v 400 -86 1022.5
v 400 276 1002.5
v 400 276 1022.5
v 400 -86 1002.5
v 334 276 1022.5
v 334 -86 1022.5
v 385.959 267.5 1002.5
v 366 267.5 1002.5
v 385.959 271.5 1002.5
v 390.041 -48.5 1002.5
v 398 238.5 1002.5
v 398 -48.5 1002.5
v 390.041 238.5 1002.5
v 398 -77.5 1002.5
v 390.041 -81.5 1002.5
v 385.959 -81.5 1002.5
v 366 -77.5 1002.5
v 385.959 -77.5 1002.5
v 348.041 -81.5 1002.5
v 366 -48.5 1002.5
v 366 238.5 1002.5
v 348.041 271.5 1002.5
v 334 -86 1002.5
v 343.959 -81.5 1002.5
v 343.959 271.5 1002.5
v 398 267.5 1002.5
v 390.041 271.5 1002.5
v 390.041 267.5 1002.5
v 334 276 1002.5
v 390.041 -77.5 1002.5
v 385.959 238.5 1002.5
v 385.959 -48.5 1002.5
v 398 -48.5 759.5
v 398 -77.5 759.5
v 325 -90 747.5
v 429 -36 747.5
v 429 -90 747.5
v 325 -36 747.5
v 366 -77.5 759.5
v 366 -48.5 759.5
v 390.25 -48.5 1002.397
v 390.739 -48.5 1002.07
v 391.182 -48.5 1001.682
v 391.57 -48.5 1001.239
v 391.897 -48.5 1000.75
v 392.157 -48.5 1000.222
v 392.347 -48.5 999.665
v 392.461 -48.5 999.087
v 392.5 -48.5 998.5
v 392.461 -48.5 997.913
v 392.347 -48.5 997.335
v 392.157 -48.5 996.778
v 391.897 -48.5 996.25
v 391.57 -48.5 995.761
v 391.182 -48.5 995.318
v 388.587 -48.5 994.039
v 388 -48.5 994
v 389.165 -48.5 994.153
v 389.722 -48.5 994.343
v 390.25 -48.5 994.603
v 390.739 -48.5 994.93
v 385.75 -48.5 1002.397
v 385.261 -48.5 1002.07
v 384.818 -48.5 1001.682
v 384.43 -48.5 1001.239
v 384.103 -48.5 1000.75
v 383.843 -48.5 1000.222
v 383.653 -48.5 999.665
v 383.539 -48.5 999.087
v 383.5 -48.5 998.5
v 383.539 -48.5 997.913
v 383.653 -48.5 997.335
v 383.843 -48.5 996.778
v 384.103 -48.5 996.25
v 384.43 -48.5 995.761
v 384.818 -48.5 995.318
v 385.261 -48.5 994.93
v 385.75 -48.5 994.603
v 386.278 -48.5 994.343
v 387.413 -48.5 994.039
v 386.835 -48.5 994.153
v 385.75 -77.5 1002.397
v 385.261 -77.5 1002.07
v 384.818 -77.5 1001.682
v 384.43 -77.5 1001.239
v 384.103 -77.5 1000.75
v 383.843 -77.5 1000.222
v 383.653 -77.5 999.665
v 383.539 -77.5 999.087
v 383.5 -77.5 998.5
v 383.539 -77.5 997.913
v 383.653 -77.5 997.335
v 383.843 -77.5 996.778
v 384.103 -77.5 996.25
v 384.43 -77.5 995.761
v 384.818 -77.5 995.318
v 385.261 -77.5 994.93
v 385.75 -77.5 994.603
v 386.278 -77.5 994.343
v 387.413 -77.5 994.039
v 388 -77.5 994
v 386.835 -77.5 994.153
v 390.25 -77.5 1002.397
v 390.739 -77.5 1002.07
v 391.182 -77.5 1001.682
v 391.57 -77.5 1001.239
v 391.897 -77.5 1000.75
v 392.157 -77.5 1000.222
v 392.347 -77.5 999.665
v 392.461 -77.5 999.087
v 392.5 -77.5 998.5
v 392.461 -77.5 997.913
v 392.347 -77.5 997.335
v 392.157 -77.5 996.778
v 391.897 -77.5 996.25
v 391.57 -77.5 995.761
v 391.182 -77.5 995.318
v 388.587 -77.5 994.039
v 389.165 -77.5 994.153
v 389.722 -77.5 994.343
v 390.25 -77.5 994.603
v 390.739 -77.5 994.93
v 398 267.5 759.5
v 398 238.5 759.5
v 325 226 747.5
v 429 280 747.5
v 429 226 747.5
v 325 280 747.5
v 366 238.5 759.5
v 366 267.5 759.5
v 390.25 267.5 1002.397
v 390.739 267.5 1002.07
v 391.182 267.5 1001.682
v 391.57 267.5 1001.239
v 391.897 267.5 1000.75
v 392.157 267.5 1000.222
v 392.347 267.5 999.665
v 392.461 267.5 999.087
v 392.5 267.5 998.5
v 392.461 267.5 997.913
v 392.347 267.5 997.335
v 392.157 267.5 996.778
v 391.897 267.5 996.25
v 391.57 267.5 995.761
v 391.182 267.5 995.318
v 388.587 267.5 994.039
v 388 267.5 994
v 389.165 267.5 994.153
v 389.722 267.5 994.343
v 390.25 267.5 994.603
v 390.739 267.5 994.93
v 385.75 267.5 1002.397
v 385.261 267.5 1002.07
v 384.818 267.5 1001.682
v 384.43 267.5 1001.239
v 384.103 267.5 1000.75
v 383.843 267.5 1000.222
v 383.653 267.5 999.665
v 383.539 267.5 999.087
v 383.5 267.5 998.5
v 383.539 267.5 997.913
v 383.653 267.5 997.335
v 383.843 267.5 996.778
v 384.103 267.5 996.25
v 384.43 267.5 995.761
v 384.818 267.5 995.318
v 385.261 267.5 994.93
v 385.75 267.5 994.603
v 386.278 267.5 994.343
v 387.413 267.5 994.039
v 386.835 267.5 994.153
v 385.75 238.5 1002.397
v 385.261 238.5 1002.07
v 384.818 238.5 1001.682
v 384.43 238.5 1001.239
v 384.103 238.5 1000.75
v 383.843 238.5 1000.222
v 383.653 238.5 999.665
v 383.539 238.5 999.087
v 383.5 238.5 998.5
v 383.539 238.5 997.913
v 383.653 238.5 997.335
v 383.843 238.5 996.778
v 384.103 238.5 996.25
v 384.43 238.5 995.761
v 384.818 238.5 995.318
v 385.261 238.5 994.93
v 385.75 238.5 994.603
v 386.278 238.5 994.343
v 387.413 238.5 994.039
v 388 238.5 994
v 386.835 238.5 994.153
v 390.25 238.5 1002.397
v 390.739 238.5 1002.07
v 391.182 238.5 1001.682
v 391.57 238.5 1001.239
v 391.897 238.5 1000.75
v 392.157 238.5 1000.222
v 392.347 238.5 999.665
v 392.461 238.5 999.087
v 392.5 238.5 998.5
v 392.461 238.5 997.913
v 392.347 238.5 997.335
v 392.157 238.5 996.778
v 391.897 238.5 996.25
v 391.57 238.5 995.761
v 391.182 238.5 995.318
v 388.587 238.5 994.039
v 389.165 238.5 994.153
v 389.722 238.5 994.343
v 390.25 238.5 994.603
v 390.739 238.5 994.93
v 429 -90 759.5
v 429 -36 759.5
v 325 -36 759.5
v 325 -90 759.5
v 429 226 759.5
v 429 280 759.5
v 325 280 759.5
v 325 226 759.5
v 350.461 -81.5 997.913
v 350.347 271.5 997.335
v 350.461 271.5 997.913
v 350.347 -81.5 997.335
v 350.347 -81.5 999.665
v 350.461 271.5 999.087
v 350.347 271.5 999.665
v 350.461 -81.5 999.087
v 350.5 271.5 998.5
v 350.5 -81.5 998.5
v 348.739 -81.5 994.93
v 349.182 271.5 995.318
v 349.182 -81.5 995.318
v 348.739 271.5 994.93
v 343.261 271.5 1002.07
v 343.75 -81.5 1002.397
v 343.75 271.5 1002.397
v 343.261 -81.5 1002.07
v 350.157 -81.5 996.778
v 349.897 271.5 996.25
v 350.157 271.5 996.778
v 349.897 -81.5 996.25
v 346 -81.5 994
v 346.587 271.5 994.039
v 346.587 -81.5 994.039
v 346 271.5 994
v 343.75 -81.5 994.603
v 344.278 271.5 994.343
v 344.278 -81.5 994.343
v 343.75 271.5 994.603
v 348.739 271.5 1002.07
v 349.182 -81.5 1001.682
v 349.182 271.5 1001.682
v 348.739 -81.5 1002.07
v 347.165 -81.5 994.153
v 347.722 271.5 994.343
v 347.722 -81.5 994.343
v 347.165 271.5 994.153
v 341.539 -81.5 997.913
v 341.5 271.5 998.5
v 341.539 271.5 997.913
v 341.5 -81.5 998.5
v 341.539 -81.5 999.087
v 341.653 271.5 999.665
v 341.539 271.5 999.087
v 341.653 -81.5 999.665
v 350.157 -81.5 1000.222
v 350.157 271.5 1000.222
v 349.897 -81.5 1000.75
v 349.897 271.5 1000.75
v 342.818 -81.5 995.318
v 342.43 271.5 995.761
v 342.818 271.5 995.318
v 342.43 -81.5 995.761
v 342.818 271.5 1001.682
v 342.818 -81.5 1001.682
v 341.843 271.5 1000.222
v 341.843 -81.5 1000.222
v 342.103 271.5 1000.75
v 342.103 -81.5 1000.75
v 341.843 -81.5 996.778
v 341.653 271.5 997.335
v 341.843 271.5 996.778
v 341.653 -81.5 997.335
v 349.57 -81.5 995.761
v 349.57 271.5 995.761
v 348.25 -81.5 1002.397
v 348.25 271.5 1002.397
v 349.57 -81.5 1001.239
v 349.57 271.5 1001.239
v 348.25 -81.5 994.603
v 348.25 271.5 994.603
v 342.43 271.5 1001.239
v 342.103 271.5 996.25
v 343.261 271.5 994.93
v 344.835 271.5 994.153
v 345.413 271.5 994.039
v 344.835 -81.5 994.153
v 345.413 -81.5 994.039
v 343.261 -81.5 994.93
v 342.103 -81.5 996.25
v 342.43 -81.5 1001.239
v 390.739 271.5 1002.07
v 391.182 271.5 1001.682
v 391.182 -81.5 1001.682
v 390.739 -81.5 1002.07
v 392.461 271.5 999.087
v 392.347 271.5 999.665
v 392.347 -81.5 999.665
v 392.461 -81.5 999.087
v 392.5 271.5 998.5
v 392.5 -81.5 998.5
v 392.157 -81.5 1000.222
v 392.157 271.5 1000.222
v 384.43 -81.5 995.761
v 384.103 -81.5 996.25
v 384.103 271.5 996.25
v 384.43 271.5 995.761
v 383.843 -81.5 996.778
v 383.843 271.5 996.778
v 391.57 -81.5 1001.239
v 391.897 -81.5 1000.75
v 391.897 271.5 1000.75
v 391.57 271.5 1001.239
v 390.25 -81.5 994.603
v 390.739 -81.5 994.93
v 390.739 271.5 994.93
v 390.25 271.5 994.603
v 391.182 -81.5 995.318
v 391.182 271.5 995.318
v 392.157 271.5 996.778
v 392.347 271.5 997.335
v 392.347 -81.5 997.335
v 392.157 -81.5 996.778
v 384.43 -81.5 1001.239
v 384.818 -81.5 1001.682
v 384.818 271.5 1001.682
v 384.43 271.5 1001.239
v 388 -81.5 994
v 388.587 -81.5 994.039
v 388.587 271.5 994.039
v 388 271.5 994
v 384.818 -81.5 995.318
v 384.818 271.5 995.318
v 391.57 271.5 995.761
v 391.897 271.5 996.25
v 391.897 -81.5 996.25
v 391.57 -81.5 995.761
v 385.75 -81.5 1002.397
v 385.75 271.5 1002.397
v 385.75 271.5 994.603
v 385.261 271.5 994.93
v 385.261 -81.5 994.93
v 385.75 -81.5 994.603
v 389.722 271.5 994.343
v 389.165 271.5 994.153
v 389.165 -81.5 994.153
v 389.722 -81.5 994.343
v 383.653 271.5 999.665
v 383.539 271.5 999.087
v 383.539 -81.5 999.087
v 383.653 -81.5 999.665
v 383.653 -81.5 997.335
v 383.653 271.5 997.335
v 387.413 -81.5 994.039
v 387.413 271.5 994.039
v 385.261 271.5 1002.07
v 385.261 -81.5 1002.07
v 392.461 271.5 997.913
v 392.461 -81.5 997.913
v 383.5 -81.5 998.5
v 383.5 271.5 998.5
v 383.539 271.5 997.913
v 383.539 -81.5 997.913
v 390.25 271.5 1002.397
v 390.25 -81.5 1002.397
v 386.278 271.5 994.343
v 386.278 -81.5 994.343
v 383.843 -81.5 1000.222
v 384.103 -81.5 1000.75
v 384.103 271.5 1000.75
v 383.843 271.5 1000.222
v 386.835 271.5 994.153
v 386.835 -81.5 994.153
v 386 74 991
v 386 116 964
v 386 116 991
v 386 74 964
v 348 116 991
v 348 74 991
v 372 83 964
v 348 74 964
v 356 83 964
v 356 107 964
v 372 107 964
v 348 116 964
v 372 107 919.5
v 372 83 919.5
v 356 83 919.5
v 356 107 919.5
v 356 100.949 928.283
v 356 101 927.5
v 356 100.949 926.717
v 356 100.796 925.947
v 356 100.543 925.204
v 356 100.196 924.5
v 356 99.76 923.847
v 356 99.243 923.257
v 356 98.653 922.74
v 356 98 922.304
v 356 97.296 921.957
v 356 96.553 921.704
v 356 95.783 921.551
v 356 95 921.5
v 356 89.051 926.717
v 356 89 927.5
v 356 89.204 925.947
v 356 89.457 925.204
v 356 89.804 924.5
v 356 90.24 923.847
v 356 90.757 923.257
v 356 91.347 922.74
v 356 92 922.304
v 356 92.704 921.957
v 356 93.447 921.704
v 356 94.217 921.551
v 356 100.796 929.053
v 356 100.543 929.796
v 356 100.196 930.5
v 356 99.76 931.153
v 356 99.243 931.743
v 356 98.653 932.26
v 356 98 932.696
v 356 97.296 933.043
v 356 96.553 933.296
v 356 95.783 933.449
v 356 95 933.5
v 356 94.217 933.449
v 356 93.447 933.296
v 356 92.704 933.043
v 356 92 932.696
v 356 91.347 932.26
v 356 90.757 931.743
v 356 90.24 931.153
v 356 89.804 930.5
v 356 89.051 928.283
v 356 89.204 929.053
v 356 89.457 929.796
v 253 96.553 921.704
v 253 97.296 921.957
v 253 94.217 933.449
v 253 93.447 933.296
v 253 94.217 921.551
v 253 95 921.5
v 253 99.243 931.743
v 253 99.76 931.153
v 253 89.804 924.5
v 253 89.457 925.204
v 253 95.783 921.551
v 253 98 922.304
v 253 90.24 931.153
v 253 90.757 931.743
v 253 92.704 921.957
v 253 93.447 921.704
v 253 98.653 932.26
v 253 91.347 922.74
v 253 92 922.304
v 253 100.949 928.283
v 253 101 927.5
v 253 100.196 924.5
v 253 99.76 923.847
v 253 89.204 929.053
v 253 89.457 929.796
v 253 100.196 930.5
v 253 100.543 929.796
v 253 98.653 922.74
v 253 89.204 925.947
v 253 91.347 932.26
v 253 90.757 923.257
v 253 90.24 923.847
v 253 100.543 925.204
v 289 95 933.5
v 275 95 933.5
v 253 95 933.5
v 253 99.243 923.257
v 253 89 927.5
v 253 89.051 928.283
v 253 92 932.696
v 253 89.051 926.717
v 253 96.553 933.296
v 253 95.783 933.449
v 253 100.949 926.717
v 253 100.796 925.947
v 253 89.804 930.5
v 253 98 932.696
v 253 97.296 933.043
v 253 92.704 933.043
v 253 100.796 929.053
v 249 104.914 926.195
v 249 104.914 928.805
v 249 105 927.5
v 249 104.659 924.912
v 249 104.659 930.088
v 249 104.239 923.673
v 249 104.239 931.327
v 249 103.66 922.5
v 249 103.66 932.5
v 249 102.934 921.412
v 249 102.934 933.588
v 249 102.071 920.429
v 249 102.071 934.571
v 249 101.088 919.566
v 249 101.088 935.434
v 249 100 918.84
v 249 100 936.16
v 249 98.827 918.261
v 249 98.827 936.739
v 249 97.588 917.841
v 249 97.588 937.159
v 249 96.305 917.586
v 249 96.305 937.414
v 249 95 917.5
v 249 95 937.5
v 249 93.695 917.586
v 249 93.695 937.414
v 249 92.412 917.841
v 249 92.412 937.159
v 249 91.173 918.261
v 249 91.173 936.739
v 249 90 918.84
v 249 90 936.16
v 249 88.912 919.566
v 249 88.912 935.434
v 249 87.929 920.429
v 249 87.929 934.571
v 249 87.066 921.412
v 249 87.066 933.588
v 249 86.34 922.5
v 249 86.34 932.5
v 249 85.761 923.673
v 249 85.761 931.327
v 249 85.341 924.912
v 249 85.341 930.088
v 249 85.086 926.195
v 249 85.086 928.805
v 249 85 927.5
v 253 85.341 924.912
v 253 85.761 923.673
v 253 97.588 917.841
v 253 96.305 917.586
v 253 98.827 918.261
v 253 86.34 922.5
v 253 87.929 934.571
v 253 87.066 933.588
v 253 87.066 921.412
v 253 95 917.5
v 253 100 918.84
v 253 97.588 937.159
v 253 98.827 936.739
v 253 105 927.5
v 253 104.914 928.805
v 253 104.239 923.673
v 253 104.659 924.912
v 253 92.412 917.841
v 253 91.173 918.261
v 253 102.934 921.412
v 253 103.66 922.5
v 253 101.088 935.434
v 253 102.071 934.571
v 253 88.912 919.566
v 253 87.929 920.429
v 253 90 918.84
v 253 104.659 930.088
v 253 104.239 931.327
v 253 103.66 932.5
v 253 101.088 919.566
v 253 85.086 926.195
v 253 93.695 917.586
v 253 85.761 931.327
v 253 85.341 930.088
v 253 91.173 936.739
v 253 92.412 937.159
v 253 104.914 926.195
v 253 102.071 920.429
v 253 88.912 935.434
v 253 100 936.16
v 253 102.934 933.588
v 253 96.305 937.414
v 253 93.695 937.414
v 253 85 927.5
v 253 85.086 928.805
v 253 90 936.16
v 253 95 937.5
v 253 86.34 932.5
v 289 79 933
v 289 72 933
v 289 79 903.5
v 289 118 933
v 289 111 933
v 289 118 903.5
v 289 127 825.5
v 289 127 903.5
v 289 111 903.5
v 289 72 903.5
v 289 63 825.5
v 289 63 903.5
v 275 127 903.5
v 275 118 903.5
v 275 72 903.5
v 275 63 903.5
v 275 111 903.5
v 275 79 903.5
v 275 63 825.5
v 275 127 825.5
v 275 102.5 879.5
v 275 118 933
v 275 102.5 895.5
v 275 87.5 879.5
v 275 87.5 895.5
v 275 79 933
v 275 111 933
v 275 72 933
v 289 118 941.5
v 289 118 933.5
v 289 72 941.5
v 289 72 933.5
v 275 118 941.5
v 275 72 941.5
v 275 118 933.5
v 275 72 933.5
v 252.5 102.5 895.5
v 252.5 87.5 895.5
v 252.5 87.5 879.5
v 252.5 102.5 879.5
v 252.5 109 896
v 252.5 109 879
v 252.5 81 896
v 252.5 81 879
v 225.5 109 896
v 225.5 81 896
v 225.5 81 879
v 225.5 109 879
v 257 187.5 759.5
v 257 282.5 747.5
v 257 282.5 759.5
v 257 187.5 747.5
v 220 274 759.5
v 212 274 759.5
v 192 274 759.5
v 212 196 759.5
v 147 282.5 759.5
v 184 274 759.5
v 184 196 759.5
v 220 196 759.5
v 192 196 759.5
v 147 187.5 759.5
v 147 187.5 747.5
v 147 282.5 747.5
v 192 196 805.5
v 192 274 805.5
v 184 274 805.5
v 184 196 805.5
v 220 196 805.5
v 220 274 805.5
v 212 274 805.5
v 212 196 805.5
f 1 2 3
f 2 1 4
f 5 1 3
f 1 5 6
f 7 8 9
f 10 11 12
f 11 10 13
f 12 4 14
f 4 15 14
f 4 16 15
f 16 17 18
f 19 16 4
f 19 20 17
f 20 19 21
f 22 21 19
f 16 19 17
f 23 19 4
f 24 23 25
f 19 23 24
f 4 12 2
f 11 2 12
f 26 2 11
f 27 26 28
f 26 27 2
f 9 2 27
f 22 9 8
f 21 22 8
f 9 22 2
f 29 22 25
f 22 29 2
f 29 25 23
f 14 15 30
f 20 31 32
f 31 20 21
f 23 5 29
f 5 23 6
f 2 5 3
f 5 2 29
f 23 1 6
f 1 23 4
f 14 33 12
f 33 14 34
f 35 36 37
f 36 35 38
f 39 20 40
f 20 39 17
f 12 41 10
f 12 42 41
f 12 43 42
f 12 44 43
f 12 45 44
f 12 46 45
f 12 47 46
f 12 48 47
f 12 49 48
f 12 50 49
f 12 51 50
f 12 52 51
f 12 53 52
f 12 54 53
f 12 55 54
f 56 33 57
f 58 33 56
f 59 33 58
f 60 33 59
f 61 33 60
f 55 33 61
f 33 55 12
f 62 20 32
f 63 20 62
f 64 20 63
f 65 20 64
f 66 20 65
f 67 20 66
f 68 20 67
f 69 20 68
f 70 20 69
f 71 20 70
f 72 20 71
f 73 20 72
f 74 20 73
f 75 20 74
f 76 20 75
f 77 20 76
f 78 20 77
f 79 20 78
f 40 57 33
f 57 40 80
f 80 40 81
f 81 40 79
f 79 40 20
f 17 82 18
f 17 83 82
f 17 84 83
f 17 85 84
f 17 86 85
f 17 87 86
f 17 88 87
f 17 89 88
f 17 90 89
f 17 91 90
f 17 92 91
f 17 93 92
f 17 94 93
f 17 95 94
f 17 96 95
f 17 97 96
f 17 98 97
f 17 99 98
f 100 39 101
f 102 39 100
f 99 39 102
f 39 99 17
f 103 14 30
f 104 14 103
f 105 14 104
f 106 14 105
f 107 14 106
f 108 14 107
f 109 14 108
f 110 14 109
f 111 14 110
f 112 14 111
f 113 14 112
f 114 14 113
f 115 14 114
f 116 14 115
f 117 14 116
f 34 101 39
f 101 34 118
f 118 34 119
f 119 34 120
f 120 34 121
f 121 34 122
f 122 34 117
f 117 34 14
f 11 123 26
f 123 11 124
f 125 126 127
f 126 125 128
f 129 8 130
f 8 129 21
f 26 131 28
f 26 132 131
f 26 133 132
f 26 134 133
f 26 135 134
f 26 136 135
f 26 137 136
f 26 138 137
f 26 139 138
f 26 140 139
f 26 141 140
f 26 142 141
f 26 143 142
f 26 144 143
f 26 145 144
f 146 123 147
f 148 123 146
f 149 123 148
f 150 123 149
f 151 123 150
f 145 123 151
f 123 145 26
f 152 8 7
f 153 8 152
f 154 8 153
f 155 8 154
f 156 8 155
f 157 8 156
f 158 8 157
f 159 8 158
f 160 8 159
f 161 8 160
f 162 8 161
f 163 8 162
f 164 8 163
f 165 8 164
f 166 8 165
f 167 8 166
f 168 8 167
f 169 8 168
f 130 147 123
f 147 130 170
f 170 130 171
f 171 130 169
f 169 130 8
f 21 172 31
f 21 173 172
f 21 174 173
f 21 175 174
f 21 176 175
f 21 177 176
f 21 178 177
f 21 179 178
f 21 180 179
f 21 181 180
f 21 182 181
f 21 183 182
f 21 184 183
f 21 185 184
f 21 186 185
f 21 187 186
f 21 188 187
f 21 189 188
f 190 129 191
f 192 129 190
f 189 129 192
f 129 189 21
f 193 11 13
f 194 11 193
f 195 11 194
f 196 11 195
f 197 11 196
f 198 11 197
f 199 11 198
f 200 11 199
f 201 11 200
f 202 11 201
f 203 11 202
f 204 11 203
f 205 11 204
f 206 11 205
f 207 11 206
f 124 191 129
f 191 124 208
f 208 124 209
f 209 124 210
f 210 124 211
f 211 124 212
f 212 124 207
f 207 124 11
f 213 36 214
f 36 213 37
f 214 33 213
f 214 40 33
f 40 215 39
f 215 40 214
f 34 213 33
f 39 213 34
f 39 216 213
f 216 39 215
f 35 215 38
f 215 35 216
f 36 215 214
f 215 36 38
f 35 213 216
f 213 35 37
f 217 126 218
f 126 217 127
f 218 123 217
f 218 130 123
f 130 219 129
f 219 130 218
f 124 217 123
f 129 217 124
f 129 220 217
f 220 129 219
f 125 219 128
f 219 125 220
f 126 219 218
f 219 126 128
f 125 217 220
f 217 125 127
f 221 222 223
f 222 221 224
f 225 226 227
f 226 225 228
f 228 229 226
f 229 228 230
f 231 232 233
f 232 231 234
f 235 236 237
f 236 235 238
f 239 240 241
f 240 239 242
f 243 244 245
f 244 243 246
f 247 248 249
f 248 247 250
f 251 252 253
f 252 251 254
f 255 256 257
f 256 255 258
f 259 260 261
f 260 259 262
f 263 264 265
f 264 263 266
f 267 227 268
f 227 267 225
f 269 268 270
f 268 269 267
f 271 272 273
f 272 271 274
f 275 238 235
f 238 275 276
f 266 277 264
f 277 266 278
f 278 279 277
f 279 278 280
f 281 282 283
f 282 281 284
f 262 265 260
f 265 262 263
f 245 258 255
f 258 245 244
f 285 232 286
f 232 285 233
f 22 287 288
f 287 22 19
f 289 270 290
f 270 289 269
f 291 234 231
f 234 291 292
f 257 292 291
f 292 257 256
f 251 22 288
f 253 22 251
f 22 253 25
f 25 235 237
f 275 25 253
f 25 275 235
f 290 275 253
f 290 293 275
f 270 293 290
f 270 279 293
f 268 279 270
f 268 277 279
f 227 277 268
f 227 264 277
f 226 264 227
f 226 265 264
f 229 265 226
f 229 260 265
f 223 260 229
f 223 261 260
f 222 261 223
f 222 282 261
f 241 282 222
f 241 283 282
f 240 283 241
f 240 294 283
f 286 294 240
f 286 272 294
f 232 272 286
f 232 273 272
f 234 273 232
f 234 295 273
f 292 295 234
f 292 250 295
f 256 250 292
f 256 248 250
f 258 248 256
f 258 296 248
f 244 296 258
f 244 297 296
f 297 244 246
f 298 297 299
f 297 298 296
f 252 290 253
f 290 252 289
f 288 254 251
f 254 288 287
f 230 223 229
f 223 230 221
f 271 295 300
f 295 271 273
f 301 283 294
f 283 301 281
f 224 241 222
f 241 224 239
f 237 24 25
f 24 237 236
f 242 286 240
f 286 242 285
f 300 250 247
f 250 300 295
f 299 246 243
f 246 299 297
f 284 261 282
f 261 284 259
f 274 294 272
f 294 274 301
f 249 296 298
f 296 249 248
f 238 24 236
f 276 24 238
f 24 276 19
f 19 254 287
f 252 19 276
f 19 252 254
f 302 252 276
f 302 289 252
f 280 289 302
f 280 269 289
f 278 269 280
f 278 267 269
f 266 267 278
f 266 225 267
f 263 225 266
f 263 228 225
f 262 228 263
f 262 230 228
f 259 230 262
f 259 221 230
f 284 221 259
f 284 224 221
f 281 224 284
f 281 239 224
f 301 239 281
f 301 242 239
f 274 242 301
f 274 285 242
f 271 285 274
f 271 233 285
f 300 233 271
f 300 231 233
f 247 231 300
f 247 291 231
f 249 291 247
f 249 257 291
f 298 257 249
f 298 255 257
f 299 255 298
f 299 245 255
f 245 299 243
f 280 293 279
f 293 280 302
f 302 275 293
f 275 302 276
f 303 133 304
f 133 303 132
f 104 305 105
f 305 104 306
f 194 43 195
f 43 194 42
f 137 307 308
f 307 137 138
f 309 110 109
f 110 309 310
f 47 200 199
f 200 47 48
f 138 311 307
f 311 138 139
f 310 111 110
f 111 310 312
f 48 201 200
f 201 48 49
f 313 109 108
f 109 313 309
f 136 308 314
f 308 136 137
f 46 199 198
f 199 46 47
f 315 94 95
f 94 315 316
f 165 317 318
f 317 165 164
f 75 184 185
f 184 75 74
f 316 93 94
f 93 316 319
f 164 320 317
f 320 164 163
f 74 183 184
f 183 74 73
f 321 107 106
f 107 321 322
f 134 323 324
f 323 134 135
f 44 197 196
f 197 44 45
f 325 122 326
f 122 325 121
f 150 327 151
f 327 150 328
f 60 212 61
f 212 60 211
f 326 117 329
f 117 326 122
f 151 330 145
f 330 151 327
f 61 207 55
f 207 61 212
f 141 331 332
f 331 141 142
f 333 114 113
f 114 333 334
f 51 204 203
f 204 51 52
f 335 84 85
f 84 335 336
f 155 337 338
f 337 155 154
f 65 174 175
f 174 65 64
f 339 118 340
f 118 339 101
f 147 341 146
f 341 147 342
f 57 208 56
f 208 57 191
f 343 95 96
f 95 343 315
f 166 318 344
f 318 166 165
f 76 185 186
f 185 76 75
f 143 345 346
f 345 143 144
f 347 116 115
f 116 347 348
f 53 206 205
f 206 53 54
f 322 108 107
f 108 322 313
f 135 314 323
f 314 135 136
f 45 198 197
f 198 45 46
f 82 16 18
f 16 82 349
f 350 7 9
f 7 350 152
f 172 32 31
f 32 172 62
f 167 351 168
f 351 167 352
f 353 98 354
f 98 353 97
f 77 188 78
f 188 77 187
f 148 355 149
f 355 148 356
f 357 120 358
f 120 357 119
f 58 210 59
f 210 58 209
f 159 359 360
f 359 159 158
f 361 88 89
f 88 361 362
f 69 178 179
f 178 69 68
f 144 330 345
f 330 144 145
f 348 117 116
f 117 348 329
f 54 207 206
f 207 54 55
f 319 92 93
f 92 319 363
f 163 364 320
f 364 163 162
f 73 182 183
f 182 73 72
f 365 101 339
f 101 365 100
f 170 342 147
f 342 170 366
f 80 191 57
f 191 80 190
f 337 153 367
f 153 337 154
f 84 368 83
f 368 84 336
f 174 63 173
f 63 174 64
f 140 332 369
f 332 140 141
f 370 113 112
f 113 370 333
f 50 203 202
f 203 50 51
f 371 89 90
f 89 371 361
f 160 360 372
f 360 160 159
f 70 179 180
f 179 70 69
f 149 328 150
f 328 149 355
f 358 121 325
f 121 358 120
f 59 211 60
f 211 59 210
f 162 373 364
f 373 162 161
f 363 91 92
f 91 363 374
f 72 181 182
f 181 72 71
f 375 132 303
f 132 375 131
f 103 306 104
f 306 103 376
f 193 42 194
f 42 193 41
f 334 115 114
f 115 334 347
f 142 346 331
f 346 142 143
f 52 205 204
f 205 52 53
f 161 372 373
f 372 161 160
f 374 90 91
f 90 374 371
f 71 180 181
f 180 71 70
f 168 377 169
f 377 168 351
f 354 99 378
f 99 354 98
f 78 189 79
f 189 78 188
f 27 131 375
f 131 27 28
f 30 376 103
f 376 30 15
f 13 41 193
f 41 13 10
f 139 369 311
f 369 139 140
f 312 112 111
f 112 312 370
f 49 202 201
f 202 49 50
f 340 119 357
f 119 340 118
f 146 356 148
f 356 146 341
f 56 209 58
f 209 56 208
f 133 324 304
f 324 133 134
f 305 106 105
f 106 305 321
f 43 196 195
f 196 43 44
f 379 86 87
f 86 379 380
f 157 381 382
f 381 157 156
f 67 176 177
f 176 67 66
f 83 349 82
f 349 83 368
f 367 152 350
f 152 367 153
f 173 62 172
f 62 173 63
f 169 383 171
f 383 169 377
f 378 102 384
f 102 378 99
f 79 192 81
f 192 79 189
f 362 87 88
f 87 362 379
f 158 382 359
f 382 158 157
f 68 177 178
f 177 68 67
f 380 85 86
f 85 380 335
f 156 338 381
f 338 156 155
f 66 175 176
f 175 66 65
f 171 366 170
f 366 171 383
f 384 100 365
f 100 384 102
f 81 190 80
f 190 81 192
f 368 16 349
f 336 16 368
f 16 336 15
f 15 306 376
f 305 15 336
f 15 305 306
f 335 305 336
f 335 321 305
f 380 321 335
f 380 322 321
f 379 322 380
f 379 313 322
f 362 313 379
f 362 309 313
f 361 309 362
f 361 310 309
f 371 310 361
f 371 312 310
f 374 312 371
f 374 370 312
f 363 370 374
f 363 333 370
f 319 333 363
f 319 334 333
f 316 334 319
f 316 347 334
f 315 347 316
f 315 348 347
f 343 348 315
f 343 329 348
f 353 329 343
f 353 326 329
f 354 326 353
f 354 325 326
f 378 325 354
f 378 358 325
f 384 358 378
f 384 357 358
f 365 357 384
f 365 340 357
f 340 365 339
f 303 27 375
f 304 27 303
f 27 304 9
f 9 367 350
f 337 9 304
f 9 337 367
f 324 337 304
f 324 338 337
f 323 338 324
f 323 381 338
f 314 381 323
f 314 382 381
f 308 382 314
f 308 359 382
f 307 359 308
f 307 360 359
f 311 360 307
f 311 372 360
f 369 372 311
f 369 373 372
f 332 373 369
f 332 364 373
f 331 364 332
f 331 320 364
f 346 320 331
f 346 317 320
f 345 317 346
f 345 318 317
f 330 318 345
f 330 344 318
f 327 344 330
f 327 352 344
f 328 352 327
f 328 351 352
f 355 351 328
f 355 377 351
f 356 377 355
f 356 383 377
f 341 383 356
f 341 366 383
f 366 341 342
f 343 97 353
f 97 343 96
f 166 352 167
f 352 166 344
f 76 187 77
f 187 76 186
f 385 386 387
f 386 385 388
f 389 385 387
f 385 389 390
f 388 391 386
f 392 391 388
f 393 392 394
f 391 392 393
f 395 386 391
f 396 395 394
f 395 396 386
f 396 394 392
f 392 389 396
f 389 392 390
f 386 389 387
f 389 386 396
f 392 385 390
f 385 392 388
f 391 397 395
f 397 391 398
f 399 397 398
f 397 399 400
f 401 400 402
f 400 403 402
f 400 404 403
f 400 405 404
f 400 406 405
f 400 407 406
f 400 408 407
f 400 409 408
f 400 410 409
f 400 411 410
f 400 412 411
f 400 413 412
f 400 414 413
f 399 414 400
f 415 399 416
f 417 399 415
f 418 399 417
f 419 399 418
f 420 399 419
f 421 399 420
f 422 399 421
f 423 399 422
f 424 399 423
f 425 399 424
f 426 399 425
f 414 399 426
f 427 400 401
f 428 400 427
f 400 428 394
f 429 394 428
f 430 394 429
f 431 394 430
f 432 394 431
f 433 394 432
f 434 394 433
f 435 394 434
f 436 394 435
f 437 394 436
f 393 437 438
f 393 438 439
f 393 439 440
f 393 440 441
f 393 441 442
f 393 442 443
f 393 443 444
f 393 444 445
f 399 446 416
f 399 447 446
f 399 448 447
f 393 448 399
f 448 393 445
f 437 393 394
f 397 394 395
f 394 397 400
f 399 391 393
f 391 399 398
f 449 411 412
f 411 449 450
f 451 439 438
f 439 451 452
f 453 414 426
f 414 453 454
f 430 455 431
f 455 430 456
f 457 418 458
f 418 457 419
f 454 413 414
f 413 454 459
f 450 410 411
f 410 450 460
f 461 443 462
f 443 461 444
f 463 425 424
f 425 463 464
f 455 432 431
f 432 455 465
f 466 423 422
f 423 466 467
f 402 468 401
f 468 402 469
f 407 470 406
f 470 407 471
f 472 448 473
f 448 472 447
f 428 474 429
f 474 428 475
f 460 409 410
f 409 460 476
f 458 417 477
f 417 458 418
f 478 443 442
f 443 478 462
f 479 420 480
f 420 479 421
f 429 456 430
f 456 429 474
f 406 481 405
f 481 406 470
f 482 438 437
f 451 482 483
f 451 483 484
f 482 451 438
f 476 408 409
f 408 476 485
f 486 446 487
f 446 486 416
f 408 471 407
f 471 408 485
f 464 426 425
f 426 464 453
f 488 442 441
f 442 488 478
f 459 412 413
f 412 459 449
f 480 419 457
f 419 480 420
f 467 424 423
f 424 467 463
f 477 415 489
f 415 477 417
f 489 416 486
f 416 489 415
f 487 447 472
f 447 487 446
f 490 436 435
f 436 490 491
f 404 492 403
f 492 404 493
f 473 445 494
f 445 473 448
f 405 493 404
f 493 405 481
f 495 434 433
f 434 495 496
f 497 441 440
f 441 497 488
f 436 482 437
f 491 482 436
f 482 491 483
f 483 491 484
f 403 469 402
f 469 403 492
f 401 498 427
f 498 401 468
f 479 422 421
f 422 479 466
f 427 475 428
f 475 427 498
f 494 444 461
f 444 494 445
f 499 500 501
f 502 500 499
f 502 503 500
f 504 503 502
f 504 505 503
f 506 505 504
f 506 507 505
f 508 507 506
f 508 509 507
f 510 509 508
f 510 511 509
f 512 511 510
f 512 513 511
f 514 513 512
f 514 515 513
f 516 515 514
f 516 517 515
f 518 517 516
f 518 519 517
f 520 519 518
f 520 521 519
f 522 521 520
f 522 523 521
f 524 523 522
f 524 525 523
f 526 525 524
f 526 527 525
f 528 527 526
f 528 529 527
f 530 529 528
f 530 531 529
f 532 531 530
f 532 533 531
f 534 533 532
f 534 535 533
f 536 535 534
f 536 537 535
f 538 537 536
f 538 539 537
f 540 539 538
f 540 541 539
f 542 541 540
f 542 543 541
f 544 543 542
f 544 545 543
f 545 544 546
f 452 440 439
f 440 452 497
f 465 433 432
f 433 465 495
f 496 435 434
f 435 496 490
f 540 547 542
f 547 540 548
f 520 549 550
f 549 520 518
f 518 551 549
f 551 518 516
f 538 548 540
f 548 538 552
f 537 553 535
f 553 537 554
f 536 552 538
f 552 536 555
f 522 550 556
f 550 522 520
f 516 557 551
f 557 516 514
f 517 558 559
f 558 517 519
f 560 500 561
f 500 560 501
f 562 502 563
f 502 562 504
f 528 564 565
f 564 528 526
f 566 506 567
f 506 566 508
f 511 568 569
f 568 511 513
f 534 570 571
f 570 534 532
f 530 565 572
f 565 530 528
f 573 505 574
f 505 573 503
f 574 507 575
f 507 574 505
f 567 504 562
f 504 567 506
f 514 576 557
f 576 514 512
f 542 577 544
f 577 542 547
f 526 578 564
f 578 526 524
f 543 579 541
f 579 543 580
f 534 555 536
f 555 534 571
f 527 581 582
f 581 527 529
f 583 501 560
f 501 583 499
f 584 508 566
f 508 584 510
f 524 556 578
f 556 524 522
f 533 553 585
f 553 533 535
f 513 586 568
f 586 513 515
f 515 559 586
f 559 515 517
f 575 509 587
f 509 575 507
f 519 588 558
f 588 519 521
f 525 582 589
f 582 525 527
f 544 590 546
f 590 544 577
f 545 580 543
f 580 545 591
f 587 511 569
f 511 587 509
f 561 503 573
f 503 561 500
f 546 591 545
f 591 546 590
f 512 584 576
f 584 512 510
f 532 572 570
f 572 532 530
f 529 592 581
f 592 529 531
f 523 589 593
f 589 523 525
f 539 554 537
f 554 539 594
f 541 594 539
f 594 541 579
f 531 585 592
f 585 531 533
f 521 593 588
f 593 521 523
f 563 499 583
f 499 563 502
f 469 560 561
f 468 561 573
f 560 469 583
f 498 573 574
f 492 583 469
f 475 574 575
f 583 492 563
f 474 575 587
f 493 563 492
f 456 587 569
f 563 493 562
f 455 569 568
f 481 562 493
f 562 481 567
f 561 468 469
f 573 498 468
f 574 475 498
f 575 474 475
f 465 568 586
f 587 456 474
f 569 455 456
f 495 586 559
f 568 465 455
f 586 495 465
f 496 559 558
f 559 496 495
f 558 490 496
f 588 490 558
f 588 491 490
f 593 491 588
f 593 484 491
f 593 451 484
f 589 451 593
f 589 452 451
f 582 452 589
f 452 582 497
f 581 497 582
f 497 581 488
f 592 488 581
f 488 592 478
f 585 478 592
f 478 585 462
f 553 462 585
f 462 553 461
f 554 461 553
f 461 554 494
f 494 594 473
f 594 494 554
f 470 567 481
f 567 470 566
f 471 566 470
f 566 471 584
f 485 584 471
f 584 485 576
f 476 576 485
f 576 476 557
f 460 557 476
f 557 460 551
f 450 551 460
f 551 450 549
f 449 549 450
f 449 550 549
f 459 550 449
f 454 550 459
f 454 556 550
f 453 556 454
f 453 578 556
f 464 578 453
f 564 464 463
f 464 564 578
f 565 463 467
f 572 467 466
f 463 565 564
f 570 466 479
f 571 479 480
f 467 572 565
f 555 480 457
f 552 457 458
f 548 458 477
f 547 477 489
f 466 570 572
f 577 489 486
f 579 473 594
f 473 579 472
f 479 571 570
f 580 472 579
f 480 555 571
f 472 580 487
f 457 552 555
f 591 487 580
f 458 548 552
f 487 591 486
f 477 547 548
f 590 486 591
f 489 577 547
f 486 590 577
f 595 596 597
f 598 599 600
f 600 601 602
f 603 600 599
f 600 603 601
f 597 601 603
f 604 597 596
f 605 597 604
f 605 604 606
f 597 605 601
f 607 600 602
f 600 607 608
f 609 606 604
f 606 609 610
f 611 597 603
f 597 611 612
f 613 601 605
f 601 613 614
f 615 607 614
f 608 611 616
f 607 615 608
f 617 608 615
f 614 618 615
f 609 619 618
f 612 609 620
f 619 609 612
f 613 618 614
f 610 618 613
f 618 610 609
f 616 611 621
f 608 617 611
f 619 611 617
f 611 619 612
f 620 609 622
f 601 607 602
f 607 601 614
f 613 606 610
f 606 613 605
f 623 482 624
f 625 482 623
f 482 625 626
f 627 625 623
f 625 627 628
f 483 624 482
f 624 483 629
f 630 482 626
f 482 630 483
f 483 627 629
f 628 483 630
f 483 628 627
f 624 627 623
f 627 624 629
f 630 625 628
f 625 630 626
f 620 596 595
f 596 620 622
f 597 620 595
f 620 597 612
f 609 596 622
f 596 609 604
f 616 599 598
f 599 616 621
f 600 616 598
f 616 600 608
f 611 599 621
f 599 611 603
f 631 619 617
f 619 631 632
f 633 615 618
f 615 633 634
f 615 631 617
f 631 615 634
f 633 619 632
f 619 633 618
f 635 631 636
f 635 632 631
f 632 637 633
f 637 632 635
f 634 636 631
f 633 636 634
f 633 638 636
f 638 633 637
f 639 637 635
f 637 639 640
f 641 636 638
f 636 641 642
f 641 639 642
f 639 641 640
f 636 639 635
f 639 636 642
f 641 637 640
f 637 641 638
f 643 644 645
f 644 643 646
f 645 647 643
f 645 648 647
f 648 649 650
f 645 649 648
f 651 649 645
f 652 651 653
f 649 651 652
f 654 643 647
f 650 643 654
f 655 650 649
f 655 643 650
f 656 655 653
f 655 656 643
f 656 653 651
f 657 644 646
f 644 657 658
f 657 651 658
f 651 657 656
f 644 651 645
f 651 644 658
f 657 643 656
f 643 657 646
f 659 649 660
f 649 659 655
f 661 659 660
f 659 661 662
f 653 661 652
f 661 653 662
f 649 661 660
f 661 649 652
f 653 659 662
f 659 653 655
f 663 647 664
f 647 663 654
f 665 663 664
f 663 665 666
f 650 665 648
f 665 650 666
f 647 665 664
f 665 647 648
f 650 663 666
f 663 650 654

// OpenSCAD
// Millimetre geometric reference; use real functional tools, not printed heated or cutting equipment.
// Source SHA-256: bfbd315f7675a8993fbc2dd92130b8bdfcf04b3970a239cccc746edd8f1b655a
$fn=48;
module rail_frame(){
translate([0, 0, 0]) rotate([0, 0, 0]) cube([66, 362, 20],center=true);
translate([15, -158, -132.5]) rotate([0, 0, 0]) cube([32, 29, 265],center=true);
translate([15, 158, -132.5]) rotate([0, 0, 0]) cube([32, 29, 265],center=true);
translate([10, -158, -259]) rotate([0, 0, 0]) cube([104, 54, 12],center=true);
translate([10, 158, -259]) rotate([0, 0, 0]) cube([104, 54, 12],center=true);
translate([-21, 0, -14]) rotate([0, 0, 0]) rotate([90,0,0]) cylinder(r=4.5,h=353,center=true);
translate([21, 0, -14]) rotate([0, 0, 0]) rotate([90,0,0]) cylinder(r=4.5,h=353,center=true);
}
module trolley(){
translate([0, 0, 0]) rotate([0, 0, 0]) cube([38, 42, 27],center=true);
translate([-3, 0, -33]) rotate([0, 0, 0]) cube([16, 24, 50],center=true);
translate([-59, 0, -50]) rotate([0, 0, 0]) rotate([0,90,0]) cylinder(r=6,h=118,center=true);
translate([-116, 0, -50]) rotate([0, 0, 0]) rotate([0,90,0]) cylinder(r=10,h=4,center=true);
}
module workpiece(){
translate([0, 0, 0]) rotate([0, 0, 0]) cube([14, 64, 78],center=true);
translate([0, 0, 73]) rotate([0, 0, 0]) cube([14, 46, 8],center=true);
translate([0, -19.5, 52]) rotate([0, 0, 0]) cube([14, 7, 33],center=true);
translate([0, 19.5, 52]) rotate([0, 0, 0]) cube([14, 7, 33],center=true);
translate([-19, 0, 23]) rotate([0, 0, 0]) cube([34, 15, 16],center=true);
translate([-43, 0, 23]) rotate([0, 0, 0]) cube([27, 28, 17],center=true);
}
module unload_cradle(){
translate([0, 0, 0]) rotate([0, 0, 0]) cube([110, 95, 12],center=true);
translate([-14, 0, 29]) rotate([0, 0, 0]) cube([8, 78, 46],center=true);
translate([14, 0, 29]) rotate([0, 0, 0]) cube([8, 78, 46],center=true);
}
translate([367, 95, 1012.5]) rotate([0,0,0]) rail_frame();
translate([367, 95, 977.5]) rotate([0,0,0]) trolley();
translate([282, 95, 864.5]) rotate([0,0,0]) workpiece();
translate([202, 235, 753.5]) rotate([0,0,0]) unload_cradle();
